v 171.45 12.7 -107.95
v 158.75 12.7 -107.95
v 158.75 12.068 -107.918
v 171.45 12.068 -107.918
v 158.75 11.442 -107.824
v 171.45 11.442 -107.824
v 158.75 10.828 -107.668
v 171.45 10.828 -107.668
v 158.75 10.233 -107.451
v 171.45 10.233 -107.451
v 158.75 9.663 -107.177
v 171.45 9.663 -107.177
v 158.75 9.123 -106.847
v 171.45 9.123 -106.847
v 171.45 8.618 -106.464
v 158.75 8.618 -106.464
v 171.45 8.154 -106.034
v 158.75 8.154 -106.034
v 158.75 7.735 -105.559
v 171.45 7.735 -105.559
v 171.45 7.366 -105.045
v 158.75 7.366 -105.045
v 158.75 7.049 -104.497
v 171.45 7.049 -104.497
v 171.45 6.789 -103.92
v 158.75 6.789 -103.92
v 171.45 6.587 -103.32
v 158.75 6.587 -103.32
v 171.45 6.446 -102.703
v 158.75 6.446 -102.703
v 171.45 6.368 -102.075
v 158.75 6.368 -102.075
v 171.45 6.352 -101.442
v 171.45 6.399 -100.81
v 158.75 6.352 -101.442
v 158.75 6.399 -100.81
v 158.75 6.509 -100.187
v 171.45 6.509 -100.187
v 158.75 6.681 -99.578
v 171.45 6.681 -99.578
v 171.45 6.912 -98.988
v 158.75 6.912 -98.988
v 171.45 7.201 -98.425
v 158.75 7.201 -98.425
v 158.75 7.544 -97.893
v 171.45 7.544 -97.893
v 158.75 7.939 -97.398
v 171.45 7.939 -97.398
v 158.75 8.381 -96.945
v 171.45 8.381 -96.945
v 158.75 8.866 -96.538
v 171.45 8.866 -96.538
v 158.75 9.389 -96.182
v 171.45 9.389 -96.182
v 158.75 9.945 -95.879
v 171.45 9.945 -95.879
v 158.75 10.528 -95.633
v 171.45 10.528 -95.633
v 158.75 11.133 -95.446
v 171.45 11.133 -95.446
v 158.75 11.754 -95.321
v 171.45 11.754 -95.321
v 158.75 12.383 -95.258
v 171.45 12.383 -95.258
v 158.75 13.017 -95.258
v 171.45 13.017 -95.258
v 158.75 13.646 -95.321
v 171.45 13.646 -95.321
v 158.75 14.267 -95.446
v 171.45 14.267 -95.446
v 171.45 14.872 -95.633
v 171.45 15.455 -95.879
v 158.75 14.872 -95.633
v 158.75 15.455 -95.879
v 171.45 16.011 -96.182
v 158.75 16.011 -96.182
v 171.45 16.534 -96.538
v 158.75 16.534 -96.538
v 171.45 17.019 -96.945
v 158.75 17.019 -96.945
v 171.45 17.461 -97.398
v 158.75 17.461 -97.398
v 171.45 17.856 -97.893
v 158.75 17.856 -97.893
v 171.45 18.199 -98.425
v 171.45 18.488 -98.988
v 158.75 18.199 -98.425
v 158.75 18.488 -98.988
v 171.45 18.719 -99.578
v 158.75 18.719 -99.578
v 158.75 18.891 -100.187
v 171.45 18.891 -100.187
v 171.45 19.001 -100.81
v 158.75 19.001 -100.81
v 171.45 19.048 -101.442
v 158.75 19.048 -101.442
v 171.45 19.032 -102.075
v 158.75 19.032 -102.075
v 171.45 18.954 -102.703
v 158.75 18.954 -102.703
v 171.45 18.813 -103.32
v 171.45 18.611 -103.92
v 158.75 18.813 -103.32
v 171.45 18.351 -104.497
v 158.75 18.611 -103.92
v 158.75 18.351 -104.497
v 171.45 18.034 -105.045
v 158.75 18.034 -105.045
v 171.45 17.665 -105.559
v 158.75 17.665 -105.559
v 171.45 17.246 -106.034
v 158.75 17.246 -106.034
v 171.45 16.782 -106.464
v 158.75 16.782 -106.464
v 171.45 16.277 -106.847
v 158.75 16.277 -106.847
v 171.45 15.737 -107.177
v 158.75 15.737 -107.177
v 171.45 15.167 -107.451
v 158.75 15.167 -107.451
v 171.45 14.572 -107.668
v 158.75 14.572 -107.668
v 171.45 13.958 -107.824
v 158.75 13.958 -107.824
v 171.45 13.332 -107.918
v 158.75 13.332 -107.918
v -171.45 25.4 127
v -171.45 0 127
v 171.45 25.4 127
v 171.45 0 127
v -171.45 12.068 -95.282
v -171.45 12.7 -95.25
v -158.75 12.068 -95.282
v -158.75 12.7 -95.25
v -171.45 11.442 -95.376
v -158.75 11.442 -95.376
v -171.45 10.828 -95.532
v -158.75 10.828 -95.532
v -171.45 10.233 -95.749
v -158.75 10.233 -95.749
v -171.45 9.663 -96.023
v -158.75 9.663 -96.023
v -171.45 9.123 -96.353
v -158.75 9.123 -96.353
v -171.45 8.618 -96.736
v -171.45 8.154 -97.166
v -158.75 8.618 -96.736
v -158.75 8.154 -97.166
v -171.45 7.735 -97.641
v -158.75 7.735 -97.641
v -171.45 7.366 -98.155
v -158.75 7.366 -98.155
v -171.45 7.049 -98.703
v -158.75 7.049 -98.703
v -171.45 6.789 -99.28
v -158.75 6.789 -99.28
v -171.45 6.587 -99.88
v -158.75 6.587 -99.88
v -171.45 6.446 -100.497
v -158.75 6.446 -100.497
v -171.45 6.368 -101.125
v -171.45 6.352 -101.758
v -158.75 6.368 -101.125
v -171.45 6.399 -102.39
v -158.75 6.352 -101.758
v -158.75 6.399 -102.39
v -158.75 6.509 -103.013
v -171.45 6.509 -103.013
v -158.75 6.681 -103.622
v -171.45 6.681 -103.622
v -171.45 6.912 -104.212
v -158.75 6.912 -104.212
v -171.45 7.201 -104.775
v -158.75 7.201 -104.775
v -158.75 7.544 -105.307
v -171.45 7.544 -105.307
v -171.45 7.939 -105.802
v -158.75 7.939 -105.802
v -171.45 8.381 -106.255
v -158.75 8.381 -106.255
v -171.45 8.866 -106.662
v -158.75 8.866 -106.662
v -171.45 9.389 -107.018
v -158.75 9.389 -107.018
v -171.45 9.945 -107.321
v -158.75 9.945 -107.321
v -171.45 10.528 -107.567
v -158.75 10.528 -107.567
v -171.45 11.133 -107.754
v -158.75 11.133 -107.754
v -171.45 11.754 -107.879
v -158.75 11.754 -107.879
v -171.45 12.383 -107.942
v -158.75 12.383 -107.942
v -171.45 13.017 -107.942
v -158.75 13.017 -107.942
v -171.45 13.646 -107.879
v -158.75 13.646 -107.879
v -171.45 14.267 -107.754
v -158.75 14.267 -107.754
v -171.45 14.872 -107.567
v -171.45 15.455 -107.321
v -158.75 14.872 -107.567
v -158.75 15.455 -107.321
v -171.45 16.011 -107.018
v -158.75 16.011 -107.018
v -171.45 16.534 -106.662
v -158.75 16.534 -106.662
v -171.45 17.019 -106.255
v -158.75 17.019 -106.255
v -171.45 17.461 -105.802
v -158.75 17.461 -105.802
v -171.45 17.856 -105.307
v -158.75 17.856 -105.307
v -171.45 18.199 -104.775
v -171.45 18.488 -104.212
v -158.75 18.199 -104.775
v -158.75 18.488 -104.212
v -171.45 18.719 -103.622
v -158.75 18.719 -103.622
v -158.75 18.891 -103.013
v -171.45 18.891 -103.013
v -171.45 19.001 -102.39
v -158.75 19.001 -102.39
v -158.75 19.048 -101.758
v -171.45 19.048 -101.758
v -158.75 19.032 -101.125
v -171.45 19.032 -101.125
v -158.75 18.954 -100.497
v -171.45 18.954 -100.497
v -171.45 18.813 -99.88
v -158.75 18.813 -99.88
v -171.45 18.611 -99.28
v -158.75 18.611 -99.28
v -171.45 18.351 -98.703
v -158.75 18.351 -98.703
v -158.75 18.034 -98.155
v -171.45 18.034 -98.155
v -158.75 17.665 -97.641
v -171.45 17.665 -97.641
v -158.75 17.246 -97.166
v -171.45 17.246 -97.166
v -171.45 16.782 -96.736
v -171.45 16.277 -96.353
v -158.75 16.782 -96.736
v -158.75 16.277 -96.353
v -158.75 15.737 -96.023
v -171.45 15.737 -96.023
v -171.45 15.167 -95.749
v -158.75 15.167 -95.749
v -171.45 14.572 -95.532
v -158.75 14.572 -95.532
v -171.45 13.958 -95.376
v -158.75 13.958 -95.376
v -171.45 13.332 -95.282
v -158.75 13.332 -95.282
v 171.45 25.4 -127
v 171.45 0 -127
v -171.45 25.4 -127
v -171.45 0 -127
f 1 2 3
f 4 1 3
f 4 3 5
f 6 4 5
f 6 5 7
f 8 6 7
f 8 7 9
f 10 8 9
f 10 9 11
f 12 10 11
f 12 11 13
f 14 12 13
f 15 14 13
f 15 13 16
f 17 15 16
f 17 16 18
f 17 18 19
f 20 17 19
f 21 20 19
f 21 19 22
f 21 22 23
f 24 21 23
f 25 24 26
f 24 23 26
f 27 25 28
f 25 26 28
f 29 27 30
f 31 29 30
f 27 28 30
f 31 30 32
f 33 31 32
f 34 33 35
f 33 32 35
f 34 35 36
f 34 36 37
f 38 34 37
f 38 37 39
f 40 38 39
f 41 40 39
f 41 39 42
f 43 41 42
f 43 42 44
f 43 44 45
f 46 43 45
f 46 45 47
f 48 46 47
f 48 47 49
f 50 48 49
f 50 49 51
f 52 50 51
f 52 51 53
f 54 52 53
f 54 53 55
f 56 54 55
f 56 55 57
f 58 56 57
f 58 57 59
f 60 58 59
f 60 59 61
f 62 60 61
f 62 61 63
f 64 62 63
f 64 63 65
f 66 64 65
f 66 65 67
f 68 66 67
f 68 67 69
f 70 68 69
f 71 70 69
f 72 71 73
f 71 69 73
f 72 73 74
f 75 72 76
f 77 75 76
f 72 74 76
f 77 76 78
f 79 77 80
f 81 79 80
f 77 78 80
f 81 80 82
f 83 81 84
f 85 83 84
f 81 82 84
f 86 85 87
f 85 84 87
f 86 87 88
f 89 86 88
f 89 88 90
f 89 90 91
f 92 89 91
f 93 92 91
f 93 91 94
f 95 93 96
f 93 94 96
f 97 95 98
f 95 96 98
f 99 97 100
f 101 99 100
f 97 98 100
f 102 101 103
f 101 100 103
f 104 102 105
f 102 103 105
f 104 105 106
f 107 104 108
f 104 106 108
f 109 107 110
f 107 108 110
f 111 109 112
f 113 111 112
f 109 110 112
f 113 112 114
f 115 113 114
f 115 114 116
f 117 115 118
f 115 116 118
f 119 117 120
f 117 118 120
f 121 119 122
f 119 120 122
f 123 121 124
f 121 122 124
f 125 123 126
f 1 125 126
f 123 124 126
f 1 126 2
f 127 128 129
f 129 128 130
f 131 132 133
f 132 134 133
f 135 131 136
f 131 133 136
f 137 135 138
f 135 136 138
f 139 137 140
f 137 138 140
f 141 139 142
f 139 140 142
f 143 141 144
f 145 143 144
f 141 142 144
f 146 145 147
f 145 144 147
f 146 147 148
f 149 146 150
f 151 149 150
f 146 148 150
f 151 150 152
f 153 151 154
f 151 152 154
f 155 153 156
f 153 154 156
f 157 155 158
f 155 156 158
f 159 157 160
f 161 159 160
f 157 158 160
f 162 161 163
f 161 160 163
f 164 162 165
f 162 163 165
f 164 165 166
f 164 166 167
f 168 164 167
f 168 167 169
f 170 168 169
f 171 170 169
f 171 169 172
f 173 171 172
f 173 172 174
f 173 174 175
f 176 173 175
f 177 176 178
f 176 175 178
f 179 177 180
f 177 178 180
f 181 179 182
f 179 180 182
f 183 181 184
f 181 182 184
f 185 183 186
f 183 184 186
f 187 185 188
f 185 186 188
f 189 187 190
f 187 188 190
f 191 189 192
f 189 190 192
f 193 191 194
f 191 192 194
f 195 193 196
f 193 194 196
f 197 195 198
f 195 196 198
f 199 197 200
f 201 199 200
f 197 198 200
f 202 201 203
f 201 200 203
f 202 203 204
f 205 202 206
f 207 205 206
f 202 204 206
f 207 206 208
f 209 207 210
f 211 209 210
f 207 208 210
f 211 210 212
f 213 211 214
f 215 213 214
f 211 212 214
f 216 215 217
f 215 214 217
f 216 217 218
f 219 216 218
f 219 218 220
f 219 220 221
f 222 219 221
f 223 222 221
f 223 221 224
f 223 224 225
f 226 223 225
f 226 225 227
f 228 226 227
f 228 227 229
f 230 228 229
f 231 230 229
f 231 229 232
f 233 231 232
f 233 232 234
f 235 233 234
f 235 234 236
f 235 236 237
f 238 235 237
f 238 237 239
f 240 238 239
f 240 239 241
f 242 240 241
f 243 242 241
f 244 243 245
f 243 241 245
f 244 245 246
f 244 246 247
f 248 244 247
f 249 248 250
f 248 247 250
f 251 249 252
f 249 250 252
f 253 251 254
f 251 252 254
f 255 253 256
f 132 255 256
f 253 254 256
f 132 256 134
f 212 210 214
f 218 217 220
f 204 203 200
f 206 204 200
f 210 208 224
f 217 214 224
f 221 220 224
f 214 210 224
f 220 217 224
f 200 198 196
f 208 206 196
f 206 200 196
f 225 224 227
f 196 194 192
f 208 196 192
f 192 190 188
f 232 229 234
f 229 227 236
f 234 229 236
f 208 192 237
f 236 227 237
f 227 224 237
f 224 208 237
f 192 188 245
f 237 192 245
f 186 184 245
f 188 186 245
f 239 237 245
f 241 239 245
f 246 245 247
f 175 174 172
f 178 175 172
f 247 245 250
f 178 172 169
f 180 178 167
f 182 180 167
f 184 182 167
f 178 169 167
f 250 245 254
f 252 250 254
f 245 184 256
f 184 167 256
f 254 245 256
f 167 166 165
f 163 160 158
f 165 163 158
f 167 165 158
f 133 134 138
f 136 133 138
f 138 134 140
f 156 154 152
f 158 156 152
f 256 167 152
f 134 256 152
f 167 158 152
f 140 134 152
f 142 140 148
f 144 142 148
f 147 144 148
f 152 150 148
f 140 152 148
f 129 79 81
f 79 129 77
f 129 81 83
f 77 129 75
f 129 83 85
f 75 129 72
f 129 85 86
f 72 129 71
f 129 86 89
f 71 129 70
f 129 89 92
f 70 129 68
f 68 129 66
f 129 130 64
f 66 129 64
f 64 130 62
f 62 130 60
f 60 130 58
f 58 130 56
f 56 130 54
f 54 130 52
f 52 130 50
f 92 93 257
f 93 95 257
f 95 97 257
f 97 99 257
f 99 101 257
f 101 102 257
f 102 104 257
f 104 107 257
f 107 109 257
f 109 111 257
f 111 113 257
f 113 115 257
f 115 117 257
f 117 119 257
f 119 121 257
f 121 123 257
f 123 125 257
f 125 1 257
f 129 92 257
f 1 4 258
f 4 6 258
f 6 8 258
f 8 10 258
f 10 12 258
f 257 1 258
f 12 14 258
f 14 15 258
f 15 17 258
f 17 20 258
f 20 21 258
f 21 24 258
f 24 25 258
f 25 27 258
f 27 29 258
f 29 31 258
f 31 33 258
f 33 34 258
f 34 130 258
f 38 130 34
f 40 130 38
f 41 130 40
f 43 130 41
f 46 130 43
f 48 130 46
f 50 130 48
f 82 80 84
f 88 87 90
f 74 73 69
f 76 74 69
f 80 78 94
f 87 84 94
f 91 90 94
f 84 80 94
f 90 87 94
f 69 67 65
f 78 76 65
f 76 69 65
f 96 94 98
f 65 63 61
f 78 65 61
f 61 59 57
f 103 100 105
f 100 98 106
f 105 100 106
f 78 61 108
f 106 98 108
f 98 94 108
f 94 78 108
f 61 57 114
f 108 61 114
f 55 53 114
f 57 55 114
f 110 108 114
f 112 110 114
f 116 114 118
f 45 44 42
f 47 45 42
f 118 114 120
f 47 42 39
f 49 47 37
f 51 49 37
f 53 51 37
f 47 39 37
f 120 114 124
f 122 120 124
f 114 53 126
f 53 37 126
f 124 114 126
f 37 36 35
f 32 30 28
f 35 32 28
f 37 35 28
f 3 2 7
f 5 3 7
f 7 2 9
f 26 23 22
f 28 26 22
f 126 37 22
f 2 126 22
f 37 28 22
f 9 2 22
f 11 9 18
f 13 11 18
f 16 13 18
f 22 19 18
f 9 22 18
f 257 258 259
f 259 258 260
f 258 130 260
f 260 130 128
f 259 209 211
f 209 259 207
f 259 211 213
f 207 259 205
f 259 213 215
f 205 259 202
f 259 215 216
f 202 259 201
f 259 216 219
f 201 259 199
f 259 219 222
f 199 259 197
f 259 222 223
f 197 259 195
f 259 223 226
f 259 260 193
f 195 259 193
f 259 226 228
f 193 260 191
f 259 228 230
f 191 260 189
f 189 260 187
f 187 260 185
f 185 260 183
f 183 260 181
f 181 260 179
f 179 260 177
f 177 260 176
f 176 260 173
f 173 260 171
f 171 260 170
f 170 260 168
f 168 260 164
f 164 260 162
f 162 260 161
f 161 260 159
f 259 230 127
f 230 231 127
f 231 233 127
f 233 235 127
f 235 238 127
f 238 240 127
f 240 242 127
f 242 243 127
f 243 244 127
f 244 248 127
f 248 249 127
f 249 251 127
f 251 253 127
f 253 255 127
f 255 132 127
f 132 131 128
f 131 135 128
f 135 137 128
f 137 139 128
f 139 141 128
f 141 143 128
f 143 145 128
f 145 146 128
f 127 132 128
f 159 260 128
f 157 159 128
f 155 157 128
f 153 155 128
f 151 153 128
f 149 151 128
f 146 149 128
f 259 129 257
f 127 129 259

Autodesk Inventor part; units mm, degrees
ref_plane "YZ Plane" through (0, 0, 0) normal (1, 0, 0) x (0, 1, 0)
ref_plane "XZ Plane" through (0, 0, 0) normal (0, 1, 0) x (-1, 0, 0)
ref_plane "XY Plane" through (0, 0, 0) normal (0, 0, 1) x (1, 0, 0)
sketch "Sketch1" plane through (0, 0, 0) normal (0, 1, 0) x (-1, 0, 0)
  line L0 (171.45, 127) -> (-171.45, 127)
  line L1 (-171.45, 127) -> (-171.45, -127)
  line L2 (-171.45, -127) -> (171.45, -127)
  line L3 (171.45, -127) -> (171.45, 127)
  line L4 (171.45, 127) -> (-171.45, -127) construction
  line L5 (-171.45, 127) -> (171.45, -127) construction
  point P0 (0, 0)
  dimension "d0" = 342.9
  dimension "d1" = 254
extrude "Extrusion1" add sketch "Sketch1" along normal blind 25.4
sketch "Sketch6" plane through (171.45, 0, 127) normal (1, 0, 0) x (0, 0, -1)
  line L0 (0, 25.4) -> (254, 25.4) projected
  line L1 (254, 0) -> (254, 25.4) projected
  point P0 (127, 0)
  point P1 (228.6, 12.7)
  dimension "d18" = 25.4
  dimension "d19" = 12.7
hole "Hole2" at (171.45, 12.7, -101.6) direction (-1, 0, 0) diameter 12.7 depth 12.7
sketch "Sketch8" plane through (-171.45, 0, -127) normal (-1, 0, 0) x (0, 0, 1)
  circle A0 centre (25.4, 12.7) radius 6.35 projected
  point P0 (127, 0)
hole "Hole3" at (-171.45, 12.7, -101.6) direction (1, 0, 0) diameter 12.7 depth 12.7
properties part number "STEP"
